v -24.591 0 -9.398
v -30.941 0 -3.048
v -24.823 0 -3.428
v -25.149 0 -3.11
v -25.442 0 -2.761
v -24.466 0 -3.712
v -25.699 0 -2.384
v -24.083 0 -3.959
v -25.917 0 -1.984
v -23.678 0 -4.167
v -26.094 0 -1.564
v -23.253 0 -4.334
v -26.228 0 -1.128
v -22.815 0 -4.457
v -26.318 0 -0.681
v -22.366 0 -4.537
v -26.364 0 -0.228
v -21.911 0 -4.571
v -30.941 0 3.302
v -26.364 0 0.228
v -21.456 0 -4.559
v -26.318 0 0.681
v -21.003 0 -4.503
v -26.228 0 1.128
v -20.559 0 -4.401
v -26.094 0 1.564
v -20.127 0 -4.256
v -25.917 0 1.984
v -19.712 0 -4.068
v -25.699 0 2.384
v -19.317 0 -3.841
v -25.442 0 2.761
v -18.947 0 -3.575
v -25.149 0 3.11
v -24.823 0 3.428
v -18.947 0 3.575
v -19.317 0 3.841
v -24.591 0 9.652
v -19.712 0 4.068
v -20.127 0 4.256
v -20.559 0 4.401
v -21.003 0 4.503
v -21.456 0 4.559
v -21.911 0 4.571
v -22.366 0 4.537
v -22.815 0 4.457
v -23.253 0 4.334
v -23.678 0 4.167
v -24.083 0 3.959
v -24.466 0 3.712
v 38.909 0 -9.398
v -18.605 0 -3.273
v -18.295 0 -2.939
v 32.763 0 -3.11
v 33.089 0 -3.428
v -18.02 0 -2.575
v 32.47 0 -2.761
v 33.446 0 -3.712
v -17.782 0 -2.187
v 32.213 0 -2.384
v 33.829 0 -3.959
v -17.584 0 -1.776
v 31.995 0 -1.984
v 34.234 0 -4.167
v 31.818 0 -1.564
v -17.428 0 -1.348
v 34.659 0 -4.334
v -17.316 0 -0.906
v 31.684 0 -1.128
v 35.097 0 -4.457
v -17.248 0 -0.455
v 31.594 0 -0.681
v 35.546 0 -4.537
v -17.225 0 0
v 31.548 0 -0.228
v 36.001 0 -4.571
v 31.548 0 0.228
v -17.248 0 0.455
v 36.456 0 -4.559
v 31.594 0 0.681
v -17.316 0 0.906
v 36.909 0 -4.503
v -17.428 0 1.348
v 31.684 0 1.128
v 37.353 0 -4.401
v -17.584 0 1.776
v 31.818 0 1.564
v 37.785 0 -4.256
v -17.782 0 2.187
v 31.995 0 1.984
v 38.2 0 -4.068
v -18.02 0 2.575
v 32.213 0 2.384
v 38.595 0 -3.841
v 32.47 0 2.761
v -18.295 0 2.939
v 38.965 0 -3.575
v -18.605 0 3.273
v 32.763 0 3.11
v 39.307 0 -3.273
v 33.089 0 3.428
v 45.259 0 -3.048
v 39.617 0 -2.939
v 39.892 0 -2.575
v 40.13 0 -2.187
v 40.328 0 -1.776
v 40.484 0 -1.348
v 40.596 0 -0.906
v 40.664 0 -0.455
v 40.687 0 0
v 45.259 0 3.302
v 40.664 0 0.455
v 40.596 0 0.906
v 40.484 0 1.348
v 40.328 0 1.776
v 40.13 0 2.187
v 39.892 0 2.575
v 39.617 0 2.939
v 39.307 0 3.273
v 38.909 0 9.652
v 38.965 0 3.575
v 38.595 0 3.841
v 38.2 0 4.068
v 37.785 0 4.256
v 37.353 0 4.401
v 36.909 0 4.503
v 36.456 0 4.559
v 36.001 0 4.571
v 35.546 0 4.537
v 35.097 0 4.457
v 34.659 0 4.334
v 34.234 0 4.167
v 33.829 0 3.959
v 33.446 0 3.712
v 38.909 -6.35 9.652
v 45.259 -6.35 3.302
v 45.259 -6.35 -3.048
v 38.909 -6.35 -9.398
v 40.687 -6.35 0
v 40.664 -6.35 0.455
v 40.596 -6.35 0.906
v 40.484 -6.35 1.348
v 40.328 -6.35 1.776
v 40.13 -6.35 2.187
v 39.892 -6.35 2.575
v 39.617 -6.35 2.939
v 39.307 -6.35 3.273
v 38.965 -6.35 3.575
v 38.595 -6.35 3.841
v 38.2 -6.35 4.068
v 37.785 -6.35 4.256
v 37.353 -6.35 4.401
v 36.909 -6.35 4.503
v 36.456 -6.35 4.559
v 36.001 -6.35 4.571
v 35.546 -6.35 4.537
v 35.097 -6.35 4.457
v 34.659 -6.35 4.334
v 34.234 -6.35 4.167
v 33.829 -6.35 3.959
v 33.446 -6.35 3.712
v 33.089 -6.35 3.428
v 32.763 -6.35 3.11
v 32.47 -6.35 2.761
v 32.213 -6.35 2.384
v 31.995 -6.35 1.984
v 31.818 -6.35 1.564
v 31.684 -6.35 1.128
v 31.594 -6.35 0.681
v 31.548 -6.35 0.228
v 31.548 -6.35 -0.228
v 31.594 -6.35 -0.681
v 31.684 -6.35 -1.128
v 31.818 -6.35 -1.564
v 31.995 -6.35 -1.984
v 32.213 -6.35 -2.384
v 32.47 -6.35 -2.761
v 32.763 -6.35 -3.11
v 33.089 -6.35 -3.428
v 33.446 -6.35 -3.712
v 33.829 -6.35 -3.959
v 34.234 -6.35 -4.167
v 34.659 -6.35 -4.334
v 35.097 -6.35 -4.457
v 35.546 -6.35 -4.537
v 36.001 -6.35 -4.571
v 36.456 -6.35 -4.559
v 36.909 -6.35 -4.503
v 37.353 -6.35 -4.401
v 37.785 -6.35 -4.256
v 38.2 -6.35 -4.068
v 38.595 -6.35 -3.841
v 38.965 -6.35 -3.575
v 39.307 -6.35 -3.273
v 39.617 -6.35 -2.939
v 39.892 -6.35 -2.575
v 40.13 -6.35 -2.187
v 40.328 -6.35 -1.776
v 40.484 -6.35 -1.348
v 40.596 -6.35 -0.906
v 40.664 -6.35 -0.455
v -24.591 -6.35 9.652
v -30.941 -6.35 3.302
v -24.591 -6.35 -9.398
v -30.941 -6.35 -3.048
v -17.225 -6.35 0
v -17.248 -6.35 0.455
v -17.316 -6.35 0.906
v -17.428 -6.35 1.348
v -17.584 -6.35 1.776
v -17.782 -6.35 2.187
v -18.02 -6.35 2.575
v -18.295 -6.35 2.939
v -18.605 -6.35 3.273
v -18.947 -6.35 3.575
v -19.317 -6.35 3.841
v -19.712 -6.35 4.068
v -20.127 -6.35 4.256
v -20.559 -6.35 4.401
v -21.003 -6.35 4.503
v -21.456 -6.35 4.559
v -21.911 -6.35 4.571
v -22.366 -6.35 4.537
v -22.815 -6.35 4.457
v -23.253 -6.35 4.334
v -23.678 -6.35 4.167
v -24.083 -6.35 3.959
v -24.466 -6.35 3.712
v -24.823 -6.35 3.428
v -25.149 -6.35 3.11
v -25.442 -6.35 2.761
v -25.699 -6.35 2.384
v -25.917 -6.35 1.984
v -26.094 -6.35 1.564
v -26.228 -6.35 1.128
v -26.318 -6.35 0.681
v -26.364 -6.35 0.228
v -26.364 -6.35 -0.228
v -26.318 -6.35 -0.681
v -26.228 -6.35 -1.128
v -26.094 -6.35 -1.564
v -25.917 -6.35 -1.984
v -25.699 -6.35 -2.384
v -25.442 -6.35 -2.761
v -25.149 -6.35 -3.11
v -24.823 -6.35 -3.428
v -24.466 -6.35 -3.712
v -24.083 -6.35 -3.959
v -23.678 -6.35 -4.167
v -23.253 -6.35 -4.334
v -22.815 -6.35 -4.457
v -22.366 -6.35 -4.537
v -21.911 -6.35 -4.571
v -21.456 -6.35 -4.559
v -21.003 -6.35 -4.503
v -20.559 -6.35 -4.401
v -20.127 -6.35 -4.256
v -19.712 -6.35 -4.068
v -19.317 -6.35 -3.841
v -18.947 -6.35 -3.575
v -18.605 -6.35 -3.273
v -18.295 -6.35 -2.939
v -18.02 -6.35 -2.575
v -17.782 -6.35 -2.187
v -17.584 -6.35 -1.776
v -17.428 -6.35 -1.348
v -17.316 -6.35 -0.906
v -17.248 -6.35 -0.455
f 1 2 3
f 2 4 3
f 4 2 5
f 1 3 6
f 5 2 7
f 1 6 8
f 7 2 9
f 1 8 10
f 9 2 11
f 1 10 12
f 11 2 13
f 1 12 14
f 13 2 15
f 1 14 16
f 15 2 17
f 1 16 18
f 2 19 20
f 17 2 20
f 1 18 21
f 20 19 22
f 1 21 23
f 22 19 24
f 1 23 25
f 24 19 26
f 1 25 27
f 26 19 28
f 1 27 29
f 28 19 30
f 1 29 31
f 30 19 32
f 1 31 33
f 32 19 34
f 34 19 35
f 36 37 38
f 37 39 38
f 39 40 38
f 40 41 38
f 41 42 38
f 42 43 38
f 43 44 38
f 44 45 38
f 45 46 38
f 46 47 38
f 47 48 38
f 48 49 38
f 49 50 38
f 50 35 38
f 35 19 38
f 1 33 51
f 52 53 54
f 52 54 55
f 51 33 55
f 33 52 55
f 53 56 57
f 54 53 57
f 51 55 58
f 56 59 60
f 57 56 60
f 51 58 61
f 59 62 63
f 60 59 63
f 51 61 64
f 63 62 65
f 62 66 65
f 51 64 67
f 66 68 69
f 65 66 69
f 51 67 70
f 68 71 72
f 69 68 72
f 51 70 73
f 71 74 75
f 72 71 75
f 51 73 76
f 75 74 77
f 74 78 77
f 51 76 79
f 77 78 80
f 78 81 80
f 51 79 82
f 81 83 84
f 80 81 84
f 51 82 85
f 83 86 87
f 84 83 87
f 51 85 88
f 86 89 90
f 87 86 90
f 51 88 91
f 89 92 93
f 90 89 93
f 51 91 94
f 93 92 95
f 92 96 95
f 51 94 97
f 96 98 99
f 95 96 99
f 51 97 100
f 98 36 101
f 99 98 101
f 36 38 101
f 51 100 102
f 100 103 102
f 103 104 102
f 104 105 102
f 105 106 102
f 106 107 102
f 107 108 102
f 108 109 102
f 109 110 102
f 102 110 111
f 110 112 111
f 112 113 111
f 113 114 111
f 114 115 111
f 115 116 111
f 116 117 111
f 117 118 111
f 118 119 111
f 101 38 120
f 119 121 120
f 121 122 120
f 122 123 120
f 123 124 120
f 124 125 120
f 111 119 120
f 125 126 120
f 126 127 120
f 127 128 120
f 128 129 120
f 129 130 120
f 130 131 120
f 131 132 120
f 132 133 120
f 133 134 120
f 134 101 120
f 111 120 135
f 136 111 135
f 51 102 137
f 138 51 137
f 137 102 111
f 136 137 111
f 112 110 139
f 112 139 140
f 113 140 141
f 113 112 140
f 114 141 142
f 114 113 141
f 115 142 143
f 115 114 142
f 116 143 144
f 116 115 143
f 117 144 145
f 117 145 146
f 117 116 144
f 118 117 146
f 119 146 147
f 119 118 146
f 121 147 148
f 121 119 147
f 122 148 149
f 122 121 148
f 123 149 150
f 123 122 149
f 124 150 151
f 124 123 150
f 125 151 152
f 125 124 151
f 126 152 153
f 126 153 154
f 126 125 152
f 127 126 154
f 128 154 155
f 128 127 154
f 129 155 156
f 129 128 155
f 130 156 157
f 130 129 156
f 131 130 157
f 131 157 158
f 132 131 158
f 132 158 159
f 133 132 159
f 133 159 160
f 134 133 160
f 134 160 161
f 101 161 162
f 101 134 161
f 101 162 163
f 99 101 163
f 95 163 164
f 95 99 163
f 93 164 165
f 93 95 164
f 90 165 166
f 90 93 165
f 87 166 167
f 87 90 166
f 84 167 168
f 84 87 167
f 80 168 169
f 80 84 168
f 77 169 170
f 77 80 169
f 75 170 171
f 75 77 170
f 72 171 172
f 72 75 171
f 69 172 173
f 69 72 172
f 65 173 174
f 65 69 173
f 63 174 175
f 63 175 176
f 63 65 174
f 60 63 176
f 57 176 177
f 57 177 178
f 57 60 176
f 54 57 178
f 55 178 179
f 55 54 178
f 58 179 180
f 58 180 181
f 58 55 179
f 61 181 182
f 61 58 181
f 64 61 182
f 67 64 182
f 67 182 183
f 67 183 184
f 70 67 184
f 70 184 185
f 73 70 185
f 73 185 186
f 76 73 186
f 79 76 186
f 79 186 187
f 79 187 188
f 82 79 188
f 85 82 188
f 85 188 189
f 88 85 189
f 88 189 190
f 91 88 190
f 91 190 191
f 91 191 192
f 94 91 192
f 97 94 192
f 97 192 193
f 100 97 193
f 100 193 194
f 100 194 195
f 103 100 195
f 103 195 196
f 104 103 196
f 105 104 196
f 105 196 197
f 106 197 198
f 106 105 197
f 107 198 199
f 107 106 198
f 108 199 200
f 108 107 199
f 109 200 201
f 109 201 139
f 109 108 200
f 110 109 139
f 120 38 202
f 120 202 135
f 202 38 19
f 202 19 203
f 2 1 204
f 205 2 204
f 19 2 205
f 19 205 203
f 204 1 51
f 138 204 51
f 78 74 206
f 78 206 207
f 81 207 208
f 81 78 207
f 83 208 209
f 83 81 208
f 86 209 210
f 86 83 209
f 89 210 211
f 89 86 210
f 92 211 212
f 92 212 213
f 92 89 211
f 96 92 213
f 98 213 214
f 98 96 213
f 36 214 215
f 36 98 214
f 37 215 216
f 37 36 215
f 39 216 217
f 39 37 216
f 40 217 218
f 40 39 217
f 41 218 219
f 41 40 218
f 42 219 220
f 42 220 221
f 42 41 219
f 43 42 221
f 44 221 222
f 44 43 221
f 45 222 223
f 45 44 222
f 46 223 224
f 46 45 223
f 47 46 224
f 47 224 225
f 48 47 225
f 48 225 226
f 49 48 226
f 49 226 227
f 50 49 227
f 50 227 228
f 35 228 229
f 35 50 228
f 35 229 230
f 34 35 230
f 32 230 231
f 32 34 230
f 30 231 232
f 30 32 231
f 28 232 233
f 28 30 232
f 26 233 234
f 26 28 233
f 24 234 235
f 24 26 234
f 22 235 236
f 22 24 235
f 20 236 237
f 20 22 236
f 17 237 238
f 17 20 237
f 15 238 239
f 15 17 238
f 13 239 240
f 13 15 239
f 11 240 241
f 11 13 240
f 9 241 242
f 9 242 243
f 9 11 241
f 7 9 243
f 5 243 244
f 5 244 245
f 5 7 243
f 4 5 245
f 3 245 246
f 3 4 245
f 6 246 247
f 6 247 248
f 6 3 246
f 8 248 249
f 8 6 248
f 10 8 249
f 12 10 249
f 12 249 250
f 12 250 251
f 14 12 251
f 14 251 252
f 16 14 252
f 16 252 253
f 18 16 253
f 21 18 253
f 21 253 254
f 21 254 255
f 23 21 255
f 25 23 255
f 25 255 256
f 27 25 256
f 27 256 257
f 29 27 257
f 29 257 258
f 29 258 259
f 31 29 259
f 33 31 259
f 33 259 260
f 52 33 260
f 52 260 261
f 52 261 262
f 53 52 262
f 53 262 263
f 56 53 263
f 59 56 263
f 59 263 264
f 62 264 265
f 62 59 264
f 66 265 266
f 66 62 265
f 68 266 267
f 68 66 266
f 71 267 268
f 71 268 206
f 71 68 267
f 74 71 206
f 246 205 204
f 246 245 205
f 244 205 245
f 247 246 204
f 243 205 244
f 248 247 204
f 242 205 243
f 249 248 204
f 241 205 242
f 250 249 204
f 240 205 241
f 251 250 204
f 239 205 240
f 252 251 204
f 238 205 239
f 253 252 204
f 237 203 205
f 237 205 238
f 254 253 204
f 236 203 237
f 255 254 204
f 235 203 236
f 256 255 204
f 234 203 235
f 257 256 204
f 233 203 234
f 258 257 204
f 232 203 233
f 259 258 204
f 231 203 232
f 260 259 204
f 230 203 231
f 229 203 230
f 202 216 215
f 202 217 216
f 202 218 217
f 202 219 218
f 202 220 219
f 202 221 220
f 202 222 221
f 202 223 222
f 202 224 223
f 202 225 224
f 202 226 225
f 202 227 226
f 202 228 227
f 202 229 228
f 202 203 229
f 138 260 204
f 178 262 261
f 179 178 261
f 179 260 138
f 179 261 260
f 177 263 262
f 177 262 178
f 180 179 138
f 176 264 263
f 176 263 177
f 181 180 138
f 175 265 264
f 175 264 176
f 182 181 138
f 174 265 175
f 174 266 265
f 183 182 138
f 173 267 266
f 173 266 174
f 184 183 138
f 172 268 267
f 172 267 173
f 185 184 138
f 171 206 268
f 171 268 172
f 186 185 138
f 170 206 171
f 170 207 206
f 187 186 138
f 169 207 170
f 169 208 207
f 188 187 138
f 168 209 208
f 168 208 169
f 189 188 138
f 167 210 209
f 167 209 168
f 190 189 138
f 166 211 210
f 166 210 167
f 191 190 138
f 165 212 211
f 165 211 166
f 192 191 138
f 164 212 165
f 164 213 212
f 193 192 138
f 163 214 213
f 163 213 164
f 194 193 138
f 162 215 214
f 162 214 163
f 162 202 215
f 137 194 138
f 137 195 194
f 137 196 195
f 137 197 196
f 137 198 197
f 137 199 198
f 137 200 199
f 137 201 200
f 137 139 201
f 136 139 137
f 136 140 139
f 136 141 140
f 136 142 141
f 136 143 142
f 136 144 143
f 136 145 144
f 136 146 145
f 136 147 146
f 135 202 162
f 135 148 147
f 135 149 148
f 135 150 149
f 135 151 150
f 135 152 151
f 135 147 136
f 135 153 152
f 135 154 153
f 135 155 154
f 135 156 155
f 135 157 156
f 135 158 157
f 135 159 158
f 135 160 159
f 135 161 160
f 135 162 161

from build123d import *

# Parameters (mm, degrees)
F0_W     = 76.2
F0_H     = 19.05
F0_R     = 4.572
F1_DEPTH = 6.35
F2_SIZE  = 6.35
F3_SIZE  = 6.35


with BuildPart() as f1:
    # F0 (on Front) → F1 (new body)
    with BuildSketch(Plane.XZ):
        with Locations((7.15868, 0.127)):
            Rectangle(F0_W, F0_H)
        with Locations((-21.79732, 0)):
            Circle(F0_R, mode=Mode.SUBTRACT)
        with Locations((36.11468, 0)):
            Circle(F0_R, mode=Mode.SUBTRACT)
    extrude(amount=F1_DEPTH)

    # F2
    f2_edges = [f1.edges().sort_by_distance(p)[0] for p in [
        (-30.94132, -3.175, 9.652),
        (45.25868, -3.175, 9.652),
        (45.25868, -3.175, -9.398),
    ]]
    chamfer(f2_edges, length=F2_SIZE)

    # F3
    f3_edges = [f1.edges().sort_by_distance(p)[0] for p in [
        (-30.94132, -3.175, -9.398),
    ]]
    chamfer(f3_edges, length=F3_SIZE)


solid = f1.part
